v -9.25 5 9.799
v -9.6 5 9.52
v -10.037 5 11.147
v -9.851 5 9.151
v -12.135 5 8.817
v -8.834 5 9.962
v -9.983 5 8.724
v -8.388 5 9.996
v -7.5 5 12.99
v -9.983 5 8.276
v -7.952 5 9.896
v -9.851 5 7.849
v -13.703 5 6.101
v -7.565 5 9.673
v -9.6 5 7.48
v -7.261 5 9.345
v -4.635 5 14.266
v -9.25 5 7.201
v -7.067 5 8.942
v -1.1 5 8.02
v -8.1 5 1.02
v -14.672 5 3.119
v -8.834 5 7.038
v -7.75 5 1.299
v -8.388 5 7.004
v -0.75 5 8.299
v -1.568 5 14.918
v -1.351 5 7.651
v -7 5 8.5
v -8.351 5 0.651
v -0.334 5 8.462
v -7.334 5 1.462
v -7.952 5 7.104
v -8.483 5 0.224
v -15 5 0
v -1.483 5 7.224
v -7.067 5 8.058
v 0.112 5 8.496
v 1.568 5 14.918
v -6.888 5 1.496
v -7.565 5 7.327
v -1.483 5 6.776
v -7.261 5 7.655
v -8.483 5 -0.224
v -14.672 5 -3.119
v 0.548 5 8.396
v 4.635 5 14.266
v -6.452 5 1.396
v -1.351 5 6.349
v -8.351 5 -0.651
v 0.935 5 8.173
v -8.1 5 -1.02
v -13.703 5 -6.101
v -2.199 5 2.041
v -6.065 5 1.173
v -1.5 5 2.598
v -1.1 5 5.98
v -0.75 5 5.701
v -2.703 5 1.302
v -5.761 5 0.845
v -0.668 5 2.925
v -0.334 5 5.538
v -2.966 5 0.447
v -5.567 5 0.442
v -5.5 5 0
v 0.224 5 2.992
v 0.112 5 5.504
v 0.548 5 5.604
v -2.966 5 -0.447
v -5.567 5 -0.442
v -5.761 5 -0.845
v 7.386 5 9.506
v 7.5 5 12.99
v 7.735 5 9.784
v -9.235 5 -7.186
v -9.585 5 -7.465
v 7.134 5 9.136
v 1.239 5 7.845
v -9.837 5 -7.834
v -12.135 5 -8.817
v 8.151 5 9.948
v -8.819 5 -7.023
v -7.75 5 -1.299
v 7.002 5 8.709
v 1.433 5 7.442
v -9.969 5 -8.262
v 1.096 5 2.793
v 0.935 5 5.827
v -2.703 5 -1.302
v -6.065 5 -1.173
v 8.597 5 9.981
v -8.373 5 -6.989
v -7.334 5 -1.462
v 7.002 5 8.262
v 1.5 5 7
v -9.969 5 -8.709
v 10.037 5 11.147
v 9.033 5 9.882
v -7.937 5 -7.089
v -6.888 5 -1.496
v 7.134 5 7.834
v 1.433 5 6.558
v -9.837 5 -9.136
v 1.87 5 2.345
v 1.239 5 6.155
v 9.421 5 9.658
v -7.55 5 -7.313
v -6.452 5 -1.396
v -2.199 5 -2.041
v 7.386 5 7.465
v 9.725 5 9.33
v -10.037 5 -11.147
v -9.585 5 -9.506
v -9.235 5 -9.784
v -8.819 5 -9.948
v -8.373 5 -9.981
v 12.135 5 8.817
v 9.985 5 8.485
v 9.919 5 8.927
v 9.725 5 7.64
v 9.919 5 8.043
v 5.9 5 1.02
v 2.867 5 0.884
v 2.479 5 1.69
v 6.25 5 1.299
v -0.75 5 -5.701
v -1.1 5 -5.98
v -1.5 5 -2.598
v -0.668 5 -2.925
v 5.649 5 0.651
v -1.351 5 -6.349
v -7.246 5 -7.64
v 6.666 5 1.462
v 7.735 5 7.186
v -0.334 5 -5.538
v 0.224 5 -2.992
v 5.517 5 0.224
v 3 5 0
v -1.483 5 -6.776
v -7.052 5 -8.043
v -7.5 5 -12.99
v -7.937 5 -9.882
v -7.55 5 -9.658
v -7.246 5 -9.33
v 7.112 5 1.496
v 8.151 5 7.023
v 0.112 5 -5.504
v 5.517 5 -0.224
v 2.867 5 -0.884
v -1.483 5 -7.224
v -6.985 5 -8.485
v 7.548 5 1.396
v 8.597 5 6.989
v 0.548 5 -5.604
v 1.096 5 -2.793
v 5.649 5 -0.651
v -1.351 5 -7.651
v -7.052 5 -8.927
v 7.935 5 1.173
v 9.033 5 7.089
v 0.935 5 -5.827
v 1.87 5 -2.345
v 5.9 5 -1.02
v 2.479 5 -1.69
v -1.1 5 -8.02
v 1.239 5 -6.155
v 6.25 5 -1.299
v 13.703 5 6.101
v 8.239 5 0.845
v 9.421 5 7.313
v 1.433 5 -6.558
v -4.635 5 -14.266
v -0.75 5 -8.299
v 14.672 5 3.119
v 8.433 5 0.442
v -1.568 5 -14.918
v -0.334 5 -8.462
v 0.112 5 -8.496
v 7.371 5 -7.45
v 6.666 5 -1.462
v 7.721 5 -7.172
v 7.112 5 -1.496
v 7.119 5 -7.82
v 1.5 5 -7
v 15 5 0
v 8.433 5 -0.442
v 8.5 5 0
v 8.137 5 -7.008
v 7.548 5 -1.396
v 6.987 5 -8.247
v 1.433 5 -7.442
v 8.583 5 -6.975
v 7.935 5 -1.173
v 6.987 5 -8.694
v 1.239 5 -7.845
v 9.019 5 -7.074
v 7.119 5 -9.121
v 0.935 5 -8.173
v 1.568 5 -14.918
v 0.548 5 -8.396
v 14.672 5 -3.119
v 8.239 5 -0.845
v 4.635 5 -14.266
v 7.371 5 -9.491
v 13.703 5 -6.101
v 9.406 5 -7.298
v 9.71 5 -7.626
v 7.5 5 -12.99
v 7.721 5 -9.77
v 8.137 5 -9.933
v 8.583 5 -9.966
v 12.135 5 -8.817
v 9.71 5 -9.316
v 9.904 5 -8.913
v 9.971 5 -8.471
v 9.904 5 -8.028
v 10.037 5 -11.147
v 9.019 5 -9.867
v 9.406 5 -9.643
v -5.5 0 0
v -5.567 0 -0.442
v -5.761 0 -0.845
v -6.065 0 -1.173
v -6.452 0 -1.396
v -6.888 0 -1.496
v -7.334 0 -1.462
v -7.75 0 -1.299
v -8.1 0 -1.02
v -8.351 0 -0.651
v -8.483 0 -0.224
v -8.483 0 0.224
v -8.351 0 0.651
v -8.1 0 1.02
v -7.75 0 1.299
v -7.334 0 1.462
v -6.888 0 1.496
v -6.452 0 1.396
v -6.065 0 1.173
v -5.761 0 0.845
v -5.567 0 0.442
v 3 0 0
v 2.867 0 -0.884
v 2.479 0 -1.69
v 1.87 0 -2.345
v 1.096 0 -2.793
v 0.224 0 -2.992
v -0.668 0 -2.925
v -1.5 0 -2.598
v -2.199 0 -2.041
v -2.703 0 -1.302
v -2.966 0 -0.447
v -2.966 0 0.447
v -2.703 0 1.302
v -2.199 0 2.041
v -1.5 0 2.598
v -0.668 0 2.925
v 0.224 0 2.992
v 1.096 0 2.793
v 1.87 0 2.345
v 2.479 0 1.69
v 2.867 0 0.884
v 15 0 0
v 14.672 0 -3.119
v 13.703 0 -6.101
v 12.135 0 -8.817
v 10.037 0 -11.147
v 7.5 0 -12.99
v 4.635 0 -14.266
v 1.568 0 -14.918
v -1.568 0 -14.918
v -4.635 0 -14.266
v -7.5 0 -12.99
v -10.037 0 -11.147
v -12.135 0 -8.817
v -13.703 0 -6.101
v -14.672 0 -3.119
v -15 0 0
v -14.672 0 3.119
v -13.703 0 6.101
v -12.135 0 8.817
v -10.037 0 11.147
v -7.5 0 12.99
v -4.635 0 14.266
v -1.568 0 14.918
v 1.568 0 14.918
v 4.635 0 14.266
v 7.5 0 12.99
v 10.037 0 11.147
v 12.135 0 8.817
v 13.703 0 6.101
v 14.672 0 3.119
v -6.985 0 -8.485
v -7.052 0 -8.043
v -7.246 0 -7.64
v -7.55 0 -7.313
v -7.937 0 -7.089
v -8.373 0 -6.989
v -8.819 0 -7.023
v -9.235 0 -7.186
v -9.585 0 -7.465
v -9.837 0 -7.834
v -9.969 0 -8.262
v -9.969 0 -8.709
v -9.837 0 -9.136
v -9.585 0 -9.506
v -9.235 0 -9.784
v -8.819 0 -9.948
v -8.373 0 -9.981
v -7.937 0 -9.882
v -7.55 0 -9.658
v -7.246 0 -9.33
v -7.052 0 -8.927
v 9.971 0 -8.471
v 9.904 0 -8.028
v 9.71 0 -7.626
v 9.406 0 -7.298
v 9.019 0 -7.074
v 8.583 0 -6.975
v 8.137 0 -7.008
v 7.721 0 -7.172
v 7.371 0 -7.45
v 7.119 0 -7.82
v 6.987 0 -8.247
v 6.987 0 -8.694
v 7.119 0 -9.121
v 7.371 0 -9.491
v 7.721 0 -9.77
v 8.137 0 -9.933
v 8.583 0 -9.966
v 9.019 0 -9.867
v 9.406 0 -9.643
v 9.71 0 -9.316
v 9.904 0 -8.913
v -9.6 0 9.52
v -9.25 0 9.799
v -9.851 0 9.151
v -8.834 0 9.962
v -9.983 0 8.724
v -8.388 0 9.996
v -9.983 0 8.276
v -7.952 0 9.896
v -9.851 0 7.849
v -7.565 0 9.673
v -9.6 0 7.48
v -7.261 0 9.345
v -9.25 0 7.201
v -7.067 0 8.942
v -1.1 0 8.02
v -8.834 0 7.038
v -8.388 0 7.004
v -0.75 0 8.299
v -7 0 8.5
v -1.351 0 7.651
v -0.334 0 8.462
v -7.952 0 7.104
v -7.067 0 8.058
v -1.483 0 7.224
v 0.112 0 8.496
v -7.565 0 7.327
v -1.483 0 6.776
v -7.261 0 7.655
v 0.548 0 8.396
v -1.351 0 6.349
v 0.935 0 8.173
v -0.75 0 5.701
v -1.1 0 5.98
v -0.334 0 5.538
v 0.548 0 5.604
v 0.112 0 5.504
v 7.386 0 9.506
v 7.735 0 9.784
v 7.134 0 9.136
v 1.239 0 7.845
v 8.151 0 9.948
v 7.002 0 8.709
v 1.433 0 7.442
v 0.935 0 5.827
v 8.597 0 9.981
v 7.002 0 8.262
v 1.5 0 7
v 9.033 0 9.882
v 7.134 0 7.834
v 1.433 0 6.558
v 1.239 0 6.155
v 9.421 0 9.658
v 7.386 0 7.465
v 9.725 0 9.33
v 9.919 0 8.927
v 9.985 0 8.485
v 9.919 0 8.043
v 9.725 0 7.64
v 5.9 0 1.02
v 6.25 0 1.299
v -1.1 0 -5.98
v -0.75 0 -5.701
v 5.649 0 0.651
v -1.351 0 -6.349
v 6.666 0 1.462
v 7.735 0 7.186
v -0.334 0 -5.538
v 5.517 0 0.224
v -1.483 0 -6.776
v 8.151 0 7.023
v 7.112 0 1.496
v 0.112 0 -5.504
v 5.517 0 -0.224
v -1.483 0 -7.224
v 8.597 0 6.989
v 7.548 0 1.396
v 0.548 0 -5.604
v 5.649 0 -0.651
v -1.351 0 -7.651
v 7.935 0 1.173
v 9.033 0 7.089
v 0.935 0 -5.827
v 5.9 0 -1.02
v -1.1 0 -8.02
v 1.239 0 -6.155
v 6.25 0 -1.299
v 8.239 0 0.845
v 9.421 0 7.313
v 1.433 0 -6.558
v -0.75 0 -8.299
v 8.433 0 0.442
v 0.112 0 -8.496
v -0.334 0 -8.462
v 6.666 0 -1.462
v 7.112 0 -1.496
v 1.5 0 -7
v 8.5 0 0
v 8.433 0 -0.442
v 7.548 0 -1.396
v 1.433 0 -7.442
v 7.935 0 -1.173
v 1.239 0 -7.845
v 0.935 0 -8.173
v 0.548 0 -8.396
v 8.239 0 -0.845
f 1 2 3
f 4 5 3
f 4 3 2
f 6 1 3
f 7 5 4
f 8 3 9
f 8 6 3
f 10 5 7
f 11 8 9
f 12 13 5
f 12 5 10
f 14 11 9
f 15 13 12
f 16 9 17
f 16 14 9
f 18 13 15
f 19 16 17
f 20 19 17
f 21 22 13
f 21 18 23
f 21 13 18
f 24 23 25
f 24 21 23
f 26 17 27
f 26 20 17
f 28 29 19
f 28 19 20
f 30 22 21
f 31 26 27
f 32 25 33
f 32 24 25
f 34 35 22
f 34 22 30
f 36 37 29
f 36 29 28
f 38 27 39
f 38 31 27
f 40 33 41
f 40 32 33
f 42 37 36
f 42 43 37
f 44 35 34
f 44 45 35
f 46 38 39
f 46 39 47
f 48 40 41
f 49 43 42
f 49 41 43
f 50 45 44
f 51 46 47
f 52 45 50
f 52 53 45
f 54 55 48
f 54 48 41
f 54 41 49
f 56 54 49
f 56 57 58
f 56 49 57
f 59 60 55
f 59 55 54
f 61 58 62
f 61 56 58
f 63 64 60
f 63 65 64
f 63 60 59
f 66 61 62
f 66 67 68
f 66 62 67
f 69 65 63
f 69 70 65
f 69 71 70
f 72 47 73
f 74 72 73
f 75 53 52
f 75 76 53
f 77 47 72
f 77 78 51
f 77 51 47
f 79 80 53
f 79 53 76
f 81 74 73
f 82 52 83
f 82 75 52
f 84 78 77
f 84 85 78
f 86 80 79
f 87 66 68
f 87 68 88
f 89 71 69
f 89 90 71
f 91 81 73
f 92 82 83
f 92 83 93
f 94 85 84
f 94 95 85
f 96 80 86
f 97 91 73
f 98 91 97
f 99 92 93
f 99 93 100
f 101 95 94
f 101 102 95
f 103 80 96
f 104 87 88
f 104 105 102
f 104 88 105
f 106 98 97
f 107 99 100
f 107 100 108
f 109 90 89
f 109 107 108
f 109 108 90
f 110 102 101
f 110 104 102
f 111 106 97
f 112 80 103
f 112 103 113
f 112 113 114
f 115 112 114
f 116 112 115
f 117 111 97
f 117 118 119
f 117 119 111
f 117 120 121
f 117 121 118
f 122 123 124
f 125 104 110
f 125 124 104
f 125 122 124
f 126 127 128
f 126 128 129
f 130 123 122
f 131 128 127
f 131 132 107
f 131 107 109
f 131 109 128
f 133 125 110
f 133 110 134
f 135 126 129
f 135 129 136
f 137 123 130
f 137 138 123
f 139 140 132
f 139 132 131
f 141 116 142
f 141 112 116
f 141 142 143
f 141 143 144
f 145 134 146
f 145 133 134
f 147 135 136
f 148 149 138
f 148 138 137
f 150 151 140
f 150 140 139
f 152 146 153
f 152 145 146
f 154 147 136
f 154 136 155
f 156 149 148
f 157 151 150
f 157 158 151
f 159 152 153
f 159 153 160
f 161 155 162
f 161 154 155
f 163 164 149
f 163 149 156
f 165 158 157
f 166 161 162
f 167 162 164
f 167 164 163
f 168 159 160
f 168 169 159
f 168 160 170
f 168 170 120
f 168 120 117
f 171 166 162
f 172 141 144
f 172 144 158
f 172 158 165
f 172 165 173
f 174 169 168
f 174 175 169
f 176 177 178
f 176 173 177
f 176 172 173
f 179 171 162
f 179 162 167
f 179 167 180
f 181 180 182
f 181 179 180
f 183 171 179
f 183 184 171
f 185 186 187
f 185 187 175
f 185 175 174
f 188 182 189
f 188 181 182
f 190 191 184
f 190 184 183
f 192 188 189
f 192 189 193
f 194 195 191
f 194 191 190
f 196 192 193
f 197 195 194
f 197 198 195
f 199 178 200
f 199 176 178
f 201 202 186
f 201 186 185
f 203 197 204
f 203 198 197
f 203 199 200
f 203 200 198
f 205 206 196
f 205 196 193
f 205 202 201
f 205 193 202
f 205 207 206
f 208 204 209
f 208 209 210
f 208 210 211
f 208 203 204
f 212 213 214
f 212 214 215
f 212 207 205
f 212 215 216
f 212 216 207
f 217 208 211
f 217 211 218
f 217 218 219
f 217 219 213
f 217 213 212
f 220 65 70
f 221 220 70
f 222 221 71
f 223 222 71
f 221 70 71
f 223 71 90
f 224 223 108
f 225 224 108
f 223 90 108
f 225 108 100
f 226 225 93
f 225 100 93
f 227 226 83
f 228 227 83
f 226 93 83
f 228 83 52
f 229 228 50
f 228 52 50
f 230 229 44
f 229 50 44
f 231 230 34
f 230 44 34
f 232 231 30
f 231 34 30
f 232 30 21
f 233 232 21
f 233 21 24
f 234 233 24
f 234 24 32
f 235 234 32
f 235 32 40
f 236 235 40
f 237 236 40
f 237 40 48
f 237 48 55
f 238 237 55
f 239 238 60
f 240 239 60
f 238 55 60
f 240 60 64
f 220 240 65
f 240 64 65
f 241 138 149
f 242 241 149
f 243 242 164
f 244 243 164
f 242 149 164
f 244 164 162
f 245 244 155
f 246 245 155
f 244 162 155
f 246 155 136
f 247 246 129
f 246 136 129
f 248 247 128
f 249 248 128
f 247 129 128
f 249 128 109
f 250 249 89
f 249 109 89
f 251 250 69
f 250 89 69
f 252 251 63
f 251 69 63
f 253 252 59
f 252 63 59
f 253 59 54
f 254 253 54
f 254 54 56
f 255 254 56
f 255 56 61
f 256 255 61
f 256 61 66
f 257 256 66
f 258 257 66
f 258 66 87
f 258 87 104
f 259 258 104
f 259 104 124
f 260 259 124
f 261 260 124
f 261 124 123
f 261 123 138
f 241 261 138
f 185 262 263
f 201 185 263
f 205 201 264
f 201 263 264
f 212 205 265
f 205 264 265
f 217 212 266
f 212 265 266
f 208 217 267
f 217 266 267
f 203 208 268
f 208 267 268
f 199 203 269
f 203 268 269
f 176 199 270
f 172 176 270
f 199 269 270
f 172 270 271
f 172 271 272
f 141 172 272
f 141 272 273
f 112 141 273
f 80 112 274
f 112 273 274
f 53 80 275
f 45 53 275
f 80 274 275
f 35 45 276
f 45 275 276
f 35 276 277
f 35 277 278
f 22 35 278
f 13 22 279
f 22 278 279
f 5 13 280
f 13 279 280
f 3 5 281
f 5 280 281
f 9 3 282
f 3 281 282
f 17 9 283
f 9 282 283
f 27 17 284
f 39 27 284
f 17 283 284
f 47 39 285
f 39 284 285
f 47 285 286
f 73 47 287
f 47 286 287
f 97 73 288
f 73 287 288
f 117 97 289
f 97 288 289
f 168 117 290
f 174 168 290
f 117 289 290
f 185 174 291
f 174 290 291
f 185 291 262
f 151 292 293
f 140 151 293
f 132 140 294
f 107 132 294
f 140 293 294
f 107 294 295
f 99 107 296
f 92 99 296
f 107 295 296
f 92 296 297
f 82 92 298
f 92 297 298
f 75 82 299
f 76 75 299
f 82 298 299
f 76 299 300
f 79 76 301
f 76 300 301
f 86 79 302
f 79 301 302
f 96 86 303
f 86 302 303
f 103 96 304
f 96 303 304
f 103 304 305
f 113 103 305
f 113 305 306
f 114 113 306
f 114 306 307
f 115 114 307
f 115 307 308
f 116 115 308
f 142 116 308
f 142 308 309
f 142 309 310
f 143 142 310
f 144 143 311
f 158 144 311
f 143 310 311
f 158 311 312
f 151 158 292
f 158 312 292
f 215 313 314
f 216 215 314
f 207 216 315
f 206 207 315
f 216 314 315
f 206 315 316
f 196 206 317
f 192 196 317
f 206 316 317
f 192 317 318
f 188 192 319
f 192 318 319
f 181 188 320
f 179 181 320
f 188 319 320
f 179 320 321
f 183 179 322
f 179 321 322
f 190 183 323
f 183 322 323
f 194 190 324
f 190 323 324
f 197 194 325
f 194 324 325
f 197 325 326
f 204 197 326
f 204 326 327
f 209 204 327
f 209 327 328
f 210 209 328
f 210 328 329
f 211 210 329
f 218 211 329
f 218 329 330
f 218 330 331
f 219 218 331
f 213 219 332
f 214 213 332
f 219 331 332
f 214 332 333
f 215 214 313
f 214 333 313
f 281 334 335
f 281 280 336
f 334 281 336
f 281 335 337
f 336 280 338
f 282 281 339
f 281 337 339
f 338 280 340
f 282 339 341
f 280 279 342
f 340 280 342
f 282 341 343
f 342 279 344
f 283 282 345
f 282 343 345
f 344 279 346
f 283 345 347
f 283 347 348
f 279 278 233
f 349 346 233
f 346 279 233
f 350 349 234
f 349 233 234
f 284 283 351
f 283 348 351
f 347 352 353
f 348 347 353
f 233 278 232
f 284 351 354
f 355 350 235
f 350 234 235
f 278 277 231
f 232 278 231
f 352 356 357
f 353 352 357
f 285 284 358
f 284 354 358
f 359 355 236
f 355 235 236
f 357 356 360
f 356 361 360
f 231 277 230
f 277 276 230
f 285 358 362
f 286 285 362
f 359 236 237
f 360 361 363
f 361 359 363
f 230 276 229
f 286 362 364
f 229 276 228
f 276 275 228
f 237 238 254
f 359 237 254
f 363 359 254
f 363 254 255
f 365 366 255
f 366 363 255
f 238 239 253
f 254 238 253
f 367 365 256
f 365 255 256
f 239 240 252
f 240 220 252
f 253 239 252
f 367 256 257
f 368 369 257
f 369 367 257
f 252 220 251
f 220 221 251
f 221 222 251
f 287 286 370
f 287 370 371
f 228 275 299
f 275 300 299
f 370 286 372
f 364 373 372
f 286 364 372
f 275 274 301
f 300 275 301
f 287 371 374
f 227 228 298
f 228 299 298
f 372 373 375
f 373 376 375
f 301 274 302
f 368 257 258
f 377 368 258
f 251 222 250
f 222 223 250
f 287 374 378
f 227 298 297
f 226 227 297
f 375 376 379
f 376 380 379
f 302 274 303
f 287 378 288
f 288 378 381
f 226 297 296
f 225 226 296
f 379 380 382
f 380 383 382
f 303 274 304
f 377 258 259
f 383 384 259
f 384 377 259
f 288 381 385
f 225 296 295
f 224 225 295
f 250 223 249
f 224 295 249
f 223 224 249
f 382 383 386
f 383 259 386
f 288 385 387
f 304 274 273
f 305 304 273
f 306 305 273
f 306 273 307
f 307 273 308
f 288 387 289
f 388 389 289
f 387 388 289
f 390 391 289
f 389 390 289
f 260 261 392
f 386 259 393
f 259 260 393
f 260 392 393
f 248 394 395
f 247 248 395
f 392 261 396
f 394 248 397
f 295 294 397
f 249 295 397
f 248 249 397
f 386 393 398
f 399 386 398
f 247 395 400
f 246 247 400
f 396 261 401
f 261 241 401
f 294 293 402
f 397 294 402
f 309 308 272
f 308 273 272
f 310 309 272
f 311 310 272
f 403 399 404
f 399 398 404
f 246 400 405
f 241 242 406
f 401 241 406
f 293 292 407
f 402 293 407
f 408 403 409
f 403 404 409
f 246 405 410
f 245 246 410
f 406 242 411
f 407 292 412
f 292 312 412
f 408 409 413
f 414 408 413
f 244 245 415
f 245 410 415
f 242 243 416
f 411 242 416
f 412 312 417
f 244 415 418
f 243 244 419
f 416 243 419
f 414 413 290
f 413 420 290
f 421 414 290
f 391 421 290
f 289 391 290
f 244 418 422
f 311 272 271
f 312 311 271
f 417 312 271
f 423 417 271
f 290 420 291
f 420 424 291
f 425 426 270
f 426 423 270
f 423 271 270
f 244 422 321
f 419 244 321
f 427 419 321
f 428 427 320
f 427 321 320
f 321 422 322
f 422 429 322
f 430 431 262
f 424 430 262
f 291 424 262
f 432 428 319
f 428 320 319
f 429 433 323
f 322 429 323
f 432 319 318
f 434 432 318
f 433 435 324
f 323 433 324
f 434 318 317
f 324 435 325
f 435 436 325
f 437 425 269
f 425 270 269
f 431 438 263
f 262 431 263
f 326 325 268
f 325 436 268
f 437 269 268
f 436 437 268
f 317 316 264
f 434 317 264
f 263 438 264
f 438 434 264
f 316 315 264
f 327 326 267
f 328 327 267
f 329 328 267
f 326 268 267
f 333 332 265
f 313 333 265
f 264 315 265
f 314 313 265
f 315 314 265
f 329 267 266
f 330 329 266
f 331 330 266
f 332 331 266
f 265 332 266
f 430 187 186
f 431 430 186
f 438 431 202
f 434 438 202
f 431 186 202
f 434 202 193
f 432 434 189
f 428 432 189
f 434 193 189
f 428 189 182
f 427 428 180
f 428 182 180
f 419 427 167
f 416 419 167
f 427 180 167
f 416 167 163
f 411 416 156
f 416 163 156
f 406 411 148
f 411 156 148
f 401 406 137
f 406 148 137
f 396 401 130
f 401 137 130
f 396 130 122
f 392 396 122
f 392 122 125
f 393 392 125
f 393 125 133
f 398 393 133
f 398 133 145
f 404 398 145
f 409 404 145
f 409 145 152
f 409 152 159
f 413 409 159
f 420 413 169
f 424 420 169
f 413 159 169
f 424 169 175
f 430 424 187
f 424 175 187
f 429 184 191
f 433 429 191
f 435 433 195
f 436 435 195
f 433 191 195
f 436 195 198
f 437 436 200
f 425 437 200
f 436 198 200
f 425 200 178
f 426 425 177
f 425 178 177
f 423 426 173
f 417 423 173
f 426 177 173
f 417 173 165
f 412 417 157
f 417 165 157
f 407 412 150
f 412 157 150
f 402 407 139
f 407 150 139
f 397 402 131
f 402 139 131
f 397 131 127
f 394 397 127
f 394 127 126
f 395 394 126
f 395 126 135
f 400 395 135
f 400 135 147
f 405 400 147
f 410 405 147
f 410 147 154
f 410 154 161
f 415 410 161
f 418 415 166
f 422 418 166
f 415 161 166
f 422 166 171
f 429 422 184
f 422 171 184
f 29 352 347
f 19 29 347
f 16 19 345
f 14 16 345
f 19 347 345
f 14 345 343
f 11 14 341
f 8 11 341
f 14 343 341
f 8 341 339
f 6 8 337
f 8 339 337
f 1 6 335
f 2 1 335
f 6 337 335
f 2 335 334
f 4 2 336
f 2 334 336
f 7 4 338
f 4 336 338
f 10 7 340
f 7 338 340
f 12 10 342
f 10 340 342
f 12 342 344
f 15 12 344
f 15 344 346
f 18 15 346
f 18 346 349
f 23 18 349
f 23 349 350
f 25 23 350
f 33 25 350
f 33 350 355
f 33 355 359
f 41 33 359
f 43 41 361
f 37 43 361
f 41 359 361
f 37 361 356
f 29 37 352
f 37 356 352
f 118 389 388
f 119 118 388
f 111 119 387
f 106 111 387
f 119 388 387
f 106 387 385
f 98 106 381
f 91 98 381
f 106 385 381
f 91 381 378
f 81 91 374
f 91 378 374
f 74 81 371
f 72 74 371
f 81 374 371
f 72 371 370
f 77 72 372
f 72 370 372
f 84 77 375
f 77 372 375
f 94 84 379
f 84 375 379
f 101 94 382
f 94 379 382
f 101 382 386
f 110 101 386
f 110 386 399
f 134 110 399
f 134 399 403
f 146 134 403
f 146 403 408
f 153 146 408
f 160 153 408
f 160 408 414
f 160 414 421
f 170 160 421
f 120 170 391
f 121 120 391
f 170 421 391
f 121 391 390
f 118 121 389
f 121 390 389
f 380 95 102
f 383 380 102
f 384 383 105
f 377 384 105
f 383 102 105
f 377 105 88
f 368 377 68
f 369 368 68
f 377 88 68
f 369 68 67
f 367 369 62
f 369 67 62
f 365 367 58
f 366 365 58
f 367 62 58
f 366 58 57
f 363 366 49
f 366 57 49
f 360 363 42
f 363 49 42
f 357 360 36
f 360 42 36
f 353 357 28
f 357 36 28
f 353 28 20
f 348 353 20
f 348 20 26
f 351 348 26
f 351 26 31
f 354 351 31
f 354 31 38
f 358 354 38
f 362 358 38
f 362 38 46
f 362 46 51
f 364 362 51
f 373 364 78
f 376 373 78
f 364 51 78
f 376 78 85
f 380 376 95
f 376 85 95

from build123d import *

# Parameters (mm, degrees)
SKETCH1_R           = 15
BOSS_EXTRUDE1_DEPTH = 5
SKETCH3_R           = 1.5
CUT_EXTRUDE2_DEPTH  = 5
SKETCH4_R           = 1.5
CUT_EXTRUDE3_DEPTH  = 5
SKETCH5_R           = 3
CUT_EXTRUDE4_DEPTH  = 10


with BuildPart() as part:
    # Sketch1 → Boss-Extrude1 (new body)
    with BuildSketch(Plane(origin=(0, 0, 0), x_dir=(1, 0, 0), z_dir=(0, 1, 0))):
        Circle(SKETCH1_R)
    extrude(amount=BOSS_EXTRUDE1_DEPTH)

    # Sketch3 → Cut-Extrude2 (cut)
    with BuildSketch(Plane.XZ):
        with Locations((-8.5, 8.5)):
            Circle(SKETCH3_R)
        with Locations((8.485281374, 8.485281374)):
            Circle(SKETCH3_R)
        with Locations((-8.485281374, -8.485281374)):
            Circle(SKETCH3_R)
        with Locations((8.470562748, -8.470562748)):
            Circle(SKETCH3_R)
    extrude(amount=-CUT_EXTRUDE2_DEPTH, mode=Mode.SUBTRACT)

    # Sketch4 → Cut-Extrude3 (cut)
    with BuildSketch(Plane(origin=(0, 5, 0), x_dir=(1, 0, 0), z_dir=(0, 1, 0))):
        with Locations((7, 0)):
            Circle(SKETCH4_R)
        with Locations((0, -7)):
            Circle(SKETCH4_R)
        with Locations((-7, 0)):
            Circle(SKETCH4_R)
        with Locations((0, 7)):
            Circle(SKETCH4_R)
    extrude(amount=-CUT_EXTRUDE3_DEPTH, mode=Mode.SUBTRACT)

    # Sketch5 → Cut-Extrude4 (cut)
    with BuildSketch(Plane(origin=(0, 5, 0), x_dir=(1, 0, 0), z_dir=(0, 1, 0))):
        Circle(SKETCH5_R)
    extrude(amount=-CUT_EXTRUDE4_DEPTH, mode=Mode.SUBTRACT)


solid = part.part
